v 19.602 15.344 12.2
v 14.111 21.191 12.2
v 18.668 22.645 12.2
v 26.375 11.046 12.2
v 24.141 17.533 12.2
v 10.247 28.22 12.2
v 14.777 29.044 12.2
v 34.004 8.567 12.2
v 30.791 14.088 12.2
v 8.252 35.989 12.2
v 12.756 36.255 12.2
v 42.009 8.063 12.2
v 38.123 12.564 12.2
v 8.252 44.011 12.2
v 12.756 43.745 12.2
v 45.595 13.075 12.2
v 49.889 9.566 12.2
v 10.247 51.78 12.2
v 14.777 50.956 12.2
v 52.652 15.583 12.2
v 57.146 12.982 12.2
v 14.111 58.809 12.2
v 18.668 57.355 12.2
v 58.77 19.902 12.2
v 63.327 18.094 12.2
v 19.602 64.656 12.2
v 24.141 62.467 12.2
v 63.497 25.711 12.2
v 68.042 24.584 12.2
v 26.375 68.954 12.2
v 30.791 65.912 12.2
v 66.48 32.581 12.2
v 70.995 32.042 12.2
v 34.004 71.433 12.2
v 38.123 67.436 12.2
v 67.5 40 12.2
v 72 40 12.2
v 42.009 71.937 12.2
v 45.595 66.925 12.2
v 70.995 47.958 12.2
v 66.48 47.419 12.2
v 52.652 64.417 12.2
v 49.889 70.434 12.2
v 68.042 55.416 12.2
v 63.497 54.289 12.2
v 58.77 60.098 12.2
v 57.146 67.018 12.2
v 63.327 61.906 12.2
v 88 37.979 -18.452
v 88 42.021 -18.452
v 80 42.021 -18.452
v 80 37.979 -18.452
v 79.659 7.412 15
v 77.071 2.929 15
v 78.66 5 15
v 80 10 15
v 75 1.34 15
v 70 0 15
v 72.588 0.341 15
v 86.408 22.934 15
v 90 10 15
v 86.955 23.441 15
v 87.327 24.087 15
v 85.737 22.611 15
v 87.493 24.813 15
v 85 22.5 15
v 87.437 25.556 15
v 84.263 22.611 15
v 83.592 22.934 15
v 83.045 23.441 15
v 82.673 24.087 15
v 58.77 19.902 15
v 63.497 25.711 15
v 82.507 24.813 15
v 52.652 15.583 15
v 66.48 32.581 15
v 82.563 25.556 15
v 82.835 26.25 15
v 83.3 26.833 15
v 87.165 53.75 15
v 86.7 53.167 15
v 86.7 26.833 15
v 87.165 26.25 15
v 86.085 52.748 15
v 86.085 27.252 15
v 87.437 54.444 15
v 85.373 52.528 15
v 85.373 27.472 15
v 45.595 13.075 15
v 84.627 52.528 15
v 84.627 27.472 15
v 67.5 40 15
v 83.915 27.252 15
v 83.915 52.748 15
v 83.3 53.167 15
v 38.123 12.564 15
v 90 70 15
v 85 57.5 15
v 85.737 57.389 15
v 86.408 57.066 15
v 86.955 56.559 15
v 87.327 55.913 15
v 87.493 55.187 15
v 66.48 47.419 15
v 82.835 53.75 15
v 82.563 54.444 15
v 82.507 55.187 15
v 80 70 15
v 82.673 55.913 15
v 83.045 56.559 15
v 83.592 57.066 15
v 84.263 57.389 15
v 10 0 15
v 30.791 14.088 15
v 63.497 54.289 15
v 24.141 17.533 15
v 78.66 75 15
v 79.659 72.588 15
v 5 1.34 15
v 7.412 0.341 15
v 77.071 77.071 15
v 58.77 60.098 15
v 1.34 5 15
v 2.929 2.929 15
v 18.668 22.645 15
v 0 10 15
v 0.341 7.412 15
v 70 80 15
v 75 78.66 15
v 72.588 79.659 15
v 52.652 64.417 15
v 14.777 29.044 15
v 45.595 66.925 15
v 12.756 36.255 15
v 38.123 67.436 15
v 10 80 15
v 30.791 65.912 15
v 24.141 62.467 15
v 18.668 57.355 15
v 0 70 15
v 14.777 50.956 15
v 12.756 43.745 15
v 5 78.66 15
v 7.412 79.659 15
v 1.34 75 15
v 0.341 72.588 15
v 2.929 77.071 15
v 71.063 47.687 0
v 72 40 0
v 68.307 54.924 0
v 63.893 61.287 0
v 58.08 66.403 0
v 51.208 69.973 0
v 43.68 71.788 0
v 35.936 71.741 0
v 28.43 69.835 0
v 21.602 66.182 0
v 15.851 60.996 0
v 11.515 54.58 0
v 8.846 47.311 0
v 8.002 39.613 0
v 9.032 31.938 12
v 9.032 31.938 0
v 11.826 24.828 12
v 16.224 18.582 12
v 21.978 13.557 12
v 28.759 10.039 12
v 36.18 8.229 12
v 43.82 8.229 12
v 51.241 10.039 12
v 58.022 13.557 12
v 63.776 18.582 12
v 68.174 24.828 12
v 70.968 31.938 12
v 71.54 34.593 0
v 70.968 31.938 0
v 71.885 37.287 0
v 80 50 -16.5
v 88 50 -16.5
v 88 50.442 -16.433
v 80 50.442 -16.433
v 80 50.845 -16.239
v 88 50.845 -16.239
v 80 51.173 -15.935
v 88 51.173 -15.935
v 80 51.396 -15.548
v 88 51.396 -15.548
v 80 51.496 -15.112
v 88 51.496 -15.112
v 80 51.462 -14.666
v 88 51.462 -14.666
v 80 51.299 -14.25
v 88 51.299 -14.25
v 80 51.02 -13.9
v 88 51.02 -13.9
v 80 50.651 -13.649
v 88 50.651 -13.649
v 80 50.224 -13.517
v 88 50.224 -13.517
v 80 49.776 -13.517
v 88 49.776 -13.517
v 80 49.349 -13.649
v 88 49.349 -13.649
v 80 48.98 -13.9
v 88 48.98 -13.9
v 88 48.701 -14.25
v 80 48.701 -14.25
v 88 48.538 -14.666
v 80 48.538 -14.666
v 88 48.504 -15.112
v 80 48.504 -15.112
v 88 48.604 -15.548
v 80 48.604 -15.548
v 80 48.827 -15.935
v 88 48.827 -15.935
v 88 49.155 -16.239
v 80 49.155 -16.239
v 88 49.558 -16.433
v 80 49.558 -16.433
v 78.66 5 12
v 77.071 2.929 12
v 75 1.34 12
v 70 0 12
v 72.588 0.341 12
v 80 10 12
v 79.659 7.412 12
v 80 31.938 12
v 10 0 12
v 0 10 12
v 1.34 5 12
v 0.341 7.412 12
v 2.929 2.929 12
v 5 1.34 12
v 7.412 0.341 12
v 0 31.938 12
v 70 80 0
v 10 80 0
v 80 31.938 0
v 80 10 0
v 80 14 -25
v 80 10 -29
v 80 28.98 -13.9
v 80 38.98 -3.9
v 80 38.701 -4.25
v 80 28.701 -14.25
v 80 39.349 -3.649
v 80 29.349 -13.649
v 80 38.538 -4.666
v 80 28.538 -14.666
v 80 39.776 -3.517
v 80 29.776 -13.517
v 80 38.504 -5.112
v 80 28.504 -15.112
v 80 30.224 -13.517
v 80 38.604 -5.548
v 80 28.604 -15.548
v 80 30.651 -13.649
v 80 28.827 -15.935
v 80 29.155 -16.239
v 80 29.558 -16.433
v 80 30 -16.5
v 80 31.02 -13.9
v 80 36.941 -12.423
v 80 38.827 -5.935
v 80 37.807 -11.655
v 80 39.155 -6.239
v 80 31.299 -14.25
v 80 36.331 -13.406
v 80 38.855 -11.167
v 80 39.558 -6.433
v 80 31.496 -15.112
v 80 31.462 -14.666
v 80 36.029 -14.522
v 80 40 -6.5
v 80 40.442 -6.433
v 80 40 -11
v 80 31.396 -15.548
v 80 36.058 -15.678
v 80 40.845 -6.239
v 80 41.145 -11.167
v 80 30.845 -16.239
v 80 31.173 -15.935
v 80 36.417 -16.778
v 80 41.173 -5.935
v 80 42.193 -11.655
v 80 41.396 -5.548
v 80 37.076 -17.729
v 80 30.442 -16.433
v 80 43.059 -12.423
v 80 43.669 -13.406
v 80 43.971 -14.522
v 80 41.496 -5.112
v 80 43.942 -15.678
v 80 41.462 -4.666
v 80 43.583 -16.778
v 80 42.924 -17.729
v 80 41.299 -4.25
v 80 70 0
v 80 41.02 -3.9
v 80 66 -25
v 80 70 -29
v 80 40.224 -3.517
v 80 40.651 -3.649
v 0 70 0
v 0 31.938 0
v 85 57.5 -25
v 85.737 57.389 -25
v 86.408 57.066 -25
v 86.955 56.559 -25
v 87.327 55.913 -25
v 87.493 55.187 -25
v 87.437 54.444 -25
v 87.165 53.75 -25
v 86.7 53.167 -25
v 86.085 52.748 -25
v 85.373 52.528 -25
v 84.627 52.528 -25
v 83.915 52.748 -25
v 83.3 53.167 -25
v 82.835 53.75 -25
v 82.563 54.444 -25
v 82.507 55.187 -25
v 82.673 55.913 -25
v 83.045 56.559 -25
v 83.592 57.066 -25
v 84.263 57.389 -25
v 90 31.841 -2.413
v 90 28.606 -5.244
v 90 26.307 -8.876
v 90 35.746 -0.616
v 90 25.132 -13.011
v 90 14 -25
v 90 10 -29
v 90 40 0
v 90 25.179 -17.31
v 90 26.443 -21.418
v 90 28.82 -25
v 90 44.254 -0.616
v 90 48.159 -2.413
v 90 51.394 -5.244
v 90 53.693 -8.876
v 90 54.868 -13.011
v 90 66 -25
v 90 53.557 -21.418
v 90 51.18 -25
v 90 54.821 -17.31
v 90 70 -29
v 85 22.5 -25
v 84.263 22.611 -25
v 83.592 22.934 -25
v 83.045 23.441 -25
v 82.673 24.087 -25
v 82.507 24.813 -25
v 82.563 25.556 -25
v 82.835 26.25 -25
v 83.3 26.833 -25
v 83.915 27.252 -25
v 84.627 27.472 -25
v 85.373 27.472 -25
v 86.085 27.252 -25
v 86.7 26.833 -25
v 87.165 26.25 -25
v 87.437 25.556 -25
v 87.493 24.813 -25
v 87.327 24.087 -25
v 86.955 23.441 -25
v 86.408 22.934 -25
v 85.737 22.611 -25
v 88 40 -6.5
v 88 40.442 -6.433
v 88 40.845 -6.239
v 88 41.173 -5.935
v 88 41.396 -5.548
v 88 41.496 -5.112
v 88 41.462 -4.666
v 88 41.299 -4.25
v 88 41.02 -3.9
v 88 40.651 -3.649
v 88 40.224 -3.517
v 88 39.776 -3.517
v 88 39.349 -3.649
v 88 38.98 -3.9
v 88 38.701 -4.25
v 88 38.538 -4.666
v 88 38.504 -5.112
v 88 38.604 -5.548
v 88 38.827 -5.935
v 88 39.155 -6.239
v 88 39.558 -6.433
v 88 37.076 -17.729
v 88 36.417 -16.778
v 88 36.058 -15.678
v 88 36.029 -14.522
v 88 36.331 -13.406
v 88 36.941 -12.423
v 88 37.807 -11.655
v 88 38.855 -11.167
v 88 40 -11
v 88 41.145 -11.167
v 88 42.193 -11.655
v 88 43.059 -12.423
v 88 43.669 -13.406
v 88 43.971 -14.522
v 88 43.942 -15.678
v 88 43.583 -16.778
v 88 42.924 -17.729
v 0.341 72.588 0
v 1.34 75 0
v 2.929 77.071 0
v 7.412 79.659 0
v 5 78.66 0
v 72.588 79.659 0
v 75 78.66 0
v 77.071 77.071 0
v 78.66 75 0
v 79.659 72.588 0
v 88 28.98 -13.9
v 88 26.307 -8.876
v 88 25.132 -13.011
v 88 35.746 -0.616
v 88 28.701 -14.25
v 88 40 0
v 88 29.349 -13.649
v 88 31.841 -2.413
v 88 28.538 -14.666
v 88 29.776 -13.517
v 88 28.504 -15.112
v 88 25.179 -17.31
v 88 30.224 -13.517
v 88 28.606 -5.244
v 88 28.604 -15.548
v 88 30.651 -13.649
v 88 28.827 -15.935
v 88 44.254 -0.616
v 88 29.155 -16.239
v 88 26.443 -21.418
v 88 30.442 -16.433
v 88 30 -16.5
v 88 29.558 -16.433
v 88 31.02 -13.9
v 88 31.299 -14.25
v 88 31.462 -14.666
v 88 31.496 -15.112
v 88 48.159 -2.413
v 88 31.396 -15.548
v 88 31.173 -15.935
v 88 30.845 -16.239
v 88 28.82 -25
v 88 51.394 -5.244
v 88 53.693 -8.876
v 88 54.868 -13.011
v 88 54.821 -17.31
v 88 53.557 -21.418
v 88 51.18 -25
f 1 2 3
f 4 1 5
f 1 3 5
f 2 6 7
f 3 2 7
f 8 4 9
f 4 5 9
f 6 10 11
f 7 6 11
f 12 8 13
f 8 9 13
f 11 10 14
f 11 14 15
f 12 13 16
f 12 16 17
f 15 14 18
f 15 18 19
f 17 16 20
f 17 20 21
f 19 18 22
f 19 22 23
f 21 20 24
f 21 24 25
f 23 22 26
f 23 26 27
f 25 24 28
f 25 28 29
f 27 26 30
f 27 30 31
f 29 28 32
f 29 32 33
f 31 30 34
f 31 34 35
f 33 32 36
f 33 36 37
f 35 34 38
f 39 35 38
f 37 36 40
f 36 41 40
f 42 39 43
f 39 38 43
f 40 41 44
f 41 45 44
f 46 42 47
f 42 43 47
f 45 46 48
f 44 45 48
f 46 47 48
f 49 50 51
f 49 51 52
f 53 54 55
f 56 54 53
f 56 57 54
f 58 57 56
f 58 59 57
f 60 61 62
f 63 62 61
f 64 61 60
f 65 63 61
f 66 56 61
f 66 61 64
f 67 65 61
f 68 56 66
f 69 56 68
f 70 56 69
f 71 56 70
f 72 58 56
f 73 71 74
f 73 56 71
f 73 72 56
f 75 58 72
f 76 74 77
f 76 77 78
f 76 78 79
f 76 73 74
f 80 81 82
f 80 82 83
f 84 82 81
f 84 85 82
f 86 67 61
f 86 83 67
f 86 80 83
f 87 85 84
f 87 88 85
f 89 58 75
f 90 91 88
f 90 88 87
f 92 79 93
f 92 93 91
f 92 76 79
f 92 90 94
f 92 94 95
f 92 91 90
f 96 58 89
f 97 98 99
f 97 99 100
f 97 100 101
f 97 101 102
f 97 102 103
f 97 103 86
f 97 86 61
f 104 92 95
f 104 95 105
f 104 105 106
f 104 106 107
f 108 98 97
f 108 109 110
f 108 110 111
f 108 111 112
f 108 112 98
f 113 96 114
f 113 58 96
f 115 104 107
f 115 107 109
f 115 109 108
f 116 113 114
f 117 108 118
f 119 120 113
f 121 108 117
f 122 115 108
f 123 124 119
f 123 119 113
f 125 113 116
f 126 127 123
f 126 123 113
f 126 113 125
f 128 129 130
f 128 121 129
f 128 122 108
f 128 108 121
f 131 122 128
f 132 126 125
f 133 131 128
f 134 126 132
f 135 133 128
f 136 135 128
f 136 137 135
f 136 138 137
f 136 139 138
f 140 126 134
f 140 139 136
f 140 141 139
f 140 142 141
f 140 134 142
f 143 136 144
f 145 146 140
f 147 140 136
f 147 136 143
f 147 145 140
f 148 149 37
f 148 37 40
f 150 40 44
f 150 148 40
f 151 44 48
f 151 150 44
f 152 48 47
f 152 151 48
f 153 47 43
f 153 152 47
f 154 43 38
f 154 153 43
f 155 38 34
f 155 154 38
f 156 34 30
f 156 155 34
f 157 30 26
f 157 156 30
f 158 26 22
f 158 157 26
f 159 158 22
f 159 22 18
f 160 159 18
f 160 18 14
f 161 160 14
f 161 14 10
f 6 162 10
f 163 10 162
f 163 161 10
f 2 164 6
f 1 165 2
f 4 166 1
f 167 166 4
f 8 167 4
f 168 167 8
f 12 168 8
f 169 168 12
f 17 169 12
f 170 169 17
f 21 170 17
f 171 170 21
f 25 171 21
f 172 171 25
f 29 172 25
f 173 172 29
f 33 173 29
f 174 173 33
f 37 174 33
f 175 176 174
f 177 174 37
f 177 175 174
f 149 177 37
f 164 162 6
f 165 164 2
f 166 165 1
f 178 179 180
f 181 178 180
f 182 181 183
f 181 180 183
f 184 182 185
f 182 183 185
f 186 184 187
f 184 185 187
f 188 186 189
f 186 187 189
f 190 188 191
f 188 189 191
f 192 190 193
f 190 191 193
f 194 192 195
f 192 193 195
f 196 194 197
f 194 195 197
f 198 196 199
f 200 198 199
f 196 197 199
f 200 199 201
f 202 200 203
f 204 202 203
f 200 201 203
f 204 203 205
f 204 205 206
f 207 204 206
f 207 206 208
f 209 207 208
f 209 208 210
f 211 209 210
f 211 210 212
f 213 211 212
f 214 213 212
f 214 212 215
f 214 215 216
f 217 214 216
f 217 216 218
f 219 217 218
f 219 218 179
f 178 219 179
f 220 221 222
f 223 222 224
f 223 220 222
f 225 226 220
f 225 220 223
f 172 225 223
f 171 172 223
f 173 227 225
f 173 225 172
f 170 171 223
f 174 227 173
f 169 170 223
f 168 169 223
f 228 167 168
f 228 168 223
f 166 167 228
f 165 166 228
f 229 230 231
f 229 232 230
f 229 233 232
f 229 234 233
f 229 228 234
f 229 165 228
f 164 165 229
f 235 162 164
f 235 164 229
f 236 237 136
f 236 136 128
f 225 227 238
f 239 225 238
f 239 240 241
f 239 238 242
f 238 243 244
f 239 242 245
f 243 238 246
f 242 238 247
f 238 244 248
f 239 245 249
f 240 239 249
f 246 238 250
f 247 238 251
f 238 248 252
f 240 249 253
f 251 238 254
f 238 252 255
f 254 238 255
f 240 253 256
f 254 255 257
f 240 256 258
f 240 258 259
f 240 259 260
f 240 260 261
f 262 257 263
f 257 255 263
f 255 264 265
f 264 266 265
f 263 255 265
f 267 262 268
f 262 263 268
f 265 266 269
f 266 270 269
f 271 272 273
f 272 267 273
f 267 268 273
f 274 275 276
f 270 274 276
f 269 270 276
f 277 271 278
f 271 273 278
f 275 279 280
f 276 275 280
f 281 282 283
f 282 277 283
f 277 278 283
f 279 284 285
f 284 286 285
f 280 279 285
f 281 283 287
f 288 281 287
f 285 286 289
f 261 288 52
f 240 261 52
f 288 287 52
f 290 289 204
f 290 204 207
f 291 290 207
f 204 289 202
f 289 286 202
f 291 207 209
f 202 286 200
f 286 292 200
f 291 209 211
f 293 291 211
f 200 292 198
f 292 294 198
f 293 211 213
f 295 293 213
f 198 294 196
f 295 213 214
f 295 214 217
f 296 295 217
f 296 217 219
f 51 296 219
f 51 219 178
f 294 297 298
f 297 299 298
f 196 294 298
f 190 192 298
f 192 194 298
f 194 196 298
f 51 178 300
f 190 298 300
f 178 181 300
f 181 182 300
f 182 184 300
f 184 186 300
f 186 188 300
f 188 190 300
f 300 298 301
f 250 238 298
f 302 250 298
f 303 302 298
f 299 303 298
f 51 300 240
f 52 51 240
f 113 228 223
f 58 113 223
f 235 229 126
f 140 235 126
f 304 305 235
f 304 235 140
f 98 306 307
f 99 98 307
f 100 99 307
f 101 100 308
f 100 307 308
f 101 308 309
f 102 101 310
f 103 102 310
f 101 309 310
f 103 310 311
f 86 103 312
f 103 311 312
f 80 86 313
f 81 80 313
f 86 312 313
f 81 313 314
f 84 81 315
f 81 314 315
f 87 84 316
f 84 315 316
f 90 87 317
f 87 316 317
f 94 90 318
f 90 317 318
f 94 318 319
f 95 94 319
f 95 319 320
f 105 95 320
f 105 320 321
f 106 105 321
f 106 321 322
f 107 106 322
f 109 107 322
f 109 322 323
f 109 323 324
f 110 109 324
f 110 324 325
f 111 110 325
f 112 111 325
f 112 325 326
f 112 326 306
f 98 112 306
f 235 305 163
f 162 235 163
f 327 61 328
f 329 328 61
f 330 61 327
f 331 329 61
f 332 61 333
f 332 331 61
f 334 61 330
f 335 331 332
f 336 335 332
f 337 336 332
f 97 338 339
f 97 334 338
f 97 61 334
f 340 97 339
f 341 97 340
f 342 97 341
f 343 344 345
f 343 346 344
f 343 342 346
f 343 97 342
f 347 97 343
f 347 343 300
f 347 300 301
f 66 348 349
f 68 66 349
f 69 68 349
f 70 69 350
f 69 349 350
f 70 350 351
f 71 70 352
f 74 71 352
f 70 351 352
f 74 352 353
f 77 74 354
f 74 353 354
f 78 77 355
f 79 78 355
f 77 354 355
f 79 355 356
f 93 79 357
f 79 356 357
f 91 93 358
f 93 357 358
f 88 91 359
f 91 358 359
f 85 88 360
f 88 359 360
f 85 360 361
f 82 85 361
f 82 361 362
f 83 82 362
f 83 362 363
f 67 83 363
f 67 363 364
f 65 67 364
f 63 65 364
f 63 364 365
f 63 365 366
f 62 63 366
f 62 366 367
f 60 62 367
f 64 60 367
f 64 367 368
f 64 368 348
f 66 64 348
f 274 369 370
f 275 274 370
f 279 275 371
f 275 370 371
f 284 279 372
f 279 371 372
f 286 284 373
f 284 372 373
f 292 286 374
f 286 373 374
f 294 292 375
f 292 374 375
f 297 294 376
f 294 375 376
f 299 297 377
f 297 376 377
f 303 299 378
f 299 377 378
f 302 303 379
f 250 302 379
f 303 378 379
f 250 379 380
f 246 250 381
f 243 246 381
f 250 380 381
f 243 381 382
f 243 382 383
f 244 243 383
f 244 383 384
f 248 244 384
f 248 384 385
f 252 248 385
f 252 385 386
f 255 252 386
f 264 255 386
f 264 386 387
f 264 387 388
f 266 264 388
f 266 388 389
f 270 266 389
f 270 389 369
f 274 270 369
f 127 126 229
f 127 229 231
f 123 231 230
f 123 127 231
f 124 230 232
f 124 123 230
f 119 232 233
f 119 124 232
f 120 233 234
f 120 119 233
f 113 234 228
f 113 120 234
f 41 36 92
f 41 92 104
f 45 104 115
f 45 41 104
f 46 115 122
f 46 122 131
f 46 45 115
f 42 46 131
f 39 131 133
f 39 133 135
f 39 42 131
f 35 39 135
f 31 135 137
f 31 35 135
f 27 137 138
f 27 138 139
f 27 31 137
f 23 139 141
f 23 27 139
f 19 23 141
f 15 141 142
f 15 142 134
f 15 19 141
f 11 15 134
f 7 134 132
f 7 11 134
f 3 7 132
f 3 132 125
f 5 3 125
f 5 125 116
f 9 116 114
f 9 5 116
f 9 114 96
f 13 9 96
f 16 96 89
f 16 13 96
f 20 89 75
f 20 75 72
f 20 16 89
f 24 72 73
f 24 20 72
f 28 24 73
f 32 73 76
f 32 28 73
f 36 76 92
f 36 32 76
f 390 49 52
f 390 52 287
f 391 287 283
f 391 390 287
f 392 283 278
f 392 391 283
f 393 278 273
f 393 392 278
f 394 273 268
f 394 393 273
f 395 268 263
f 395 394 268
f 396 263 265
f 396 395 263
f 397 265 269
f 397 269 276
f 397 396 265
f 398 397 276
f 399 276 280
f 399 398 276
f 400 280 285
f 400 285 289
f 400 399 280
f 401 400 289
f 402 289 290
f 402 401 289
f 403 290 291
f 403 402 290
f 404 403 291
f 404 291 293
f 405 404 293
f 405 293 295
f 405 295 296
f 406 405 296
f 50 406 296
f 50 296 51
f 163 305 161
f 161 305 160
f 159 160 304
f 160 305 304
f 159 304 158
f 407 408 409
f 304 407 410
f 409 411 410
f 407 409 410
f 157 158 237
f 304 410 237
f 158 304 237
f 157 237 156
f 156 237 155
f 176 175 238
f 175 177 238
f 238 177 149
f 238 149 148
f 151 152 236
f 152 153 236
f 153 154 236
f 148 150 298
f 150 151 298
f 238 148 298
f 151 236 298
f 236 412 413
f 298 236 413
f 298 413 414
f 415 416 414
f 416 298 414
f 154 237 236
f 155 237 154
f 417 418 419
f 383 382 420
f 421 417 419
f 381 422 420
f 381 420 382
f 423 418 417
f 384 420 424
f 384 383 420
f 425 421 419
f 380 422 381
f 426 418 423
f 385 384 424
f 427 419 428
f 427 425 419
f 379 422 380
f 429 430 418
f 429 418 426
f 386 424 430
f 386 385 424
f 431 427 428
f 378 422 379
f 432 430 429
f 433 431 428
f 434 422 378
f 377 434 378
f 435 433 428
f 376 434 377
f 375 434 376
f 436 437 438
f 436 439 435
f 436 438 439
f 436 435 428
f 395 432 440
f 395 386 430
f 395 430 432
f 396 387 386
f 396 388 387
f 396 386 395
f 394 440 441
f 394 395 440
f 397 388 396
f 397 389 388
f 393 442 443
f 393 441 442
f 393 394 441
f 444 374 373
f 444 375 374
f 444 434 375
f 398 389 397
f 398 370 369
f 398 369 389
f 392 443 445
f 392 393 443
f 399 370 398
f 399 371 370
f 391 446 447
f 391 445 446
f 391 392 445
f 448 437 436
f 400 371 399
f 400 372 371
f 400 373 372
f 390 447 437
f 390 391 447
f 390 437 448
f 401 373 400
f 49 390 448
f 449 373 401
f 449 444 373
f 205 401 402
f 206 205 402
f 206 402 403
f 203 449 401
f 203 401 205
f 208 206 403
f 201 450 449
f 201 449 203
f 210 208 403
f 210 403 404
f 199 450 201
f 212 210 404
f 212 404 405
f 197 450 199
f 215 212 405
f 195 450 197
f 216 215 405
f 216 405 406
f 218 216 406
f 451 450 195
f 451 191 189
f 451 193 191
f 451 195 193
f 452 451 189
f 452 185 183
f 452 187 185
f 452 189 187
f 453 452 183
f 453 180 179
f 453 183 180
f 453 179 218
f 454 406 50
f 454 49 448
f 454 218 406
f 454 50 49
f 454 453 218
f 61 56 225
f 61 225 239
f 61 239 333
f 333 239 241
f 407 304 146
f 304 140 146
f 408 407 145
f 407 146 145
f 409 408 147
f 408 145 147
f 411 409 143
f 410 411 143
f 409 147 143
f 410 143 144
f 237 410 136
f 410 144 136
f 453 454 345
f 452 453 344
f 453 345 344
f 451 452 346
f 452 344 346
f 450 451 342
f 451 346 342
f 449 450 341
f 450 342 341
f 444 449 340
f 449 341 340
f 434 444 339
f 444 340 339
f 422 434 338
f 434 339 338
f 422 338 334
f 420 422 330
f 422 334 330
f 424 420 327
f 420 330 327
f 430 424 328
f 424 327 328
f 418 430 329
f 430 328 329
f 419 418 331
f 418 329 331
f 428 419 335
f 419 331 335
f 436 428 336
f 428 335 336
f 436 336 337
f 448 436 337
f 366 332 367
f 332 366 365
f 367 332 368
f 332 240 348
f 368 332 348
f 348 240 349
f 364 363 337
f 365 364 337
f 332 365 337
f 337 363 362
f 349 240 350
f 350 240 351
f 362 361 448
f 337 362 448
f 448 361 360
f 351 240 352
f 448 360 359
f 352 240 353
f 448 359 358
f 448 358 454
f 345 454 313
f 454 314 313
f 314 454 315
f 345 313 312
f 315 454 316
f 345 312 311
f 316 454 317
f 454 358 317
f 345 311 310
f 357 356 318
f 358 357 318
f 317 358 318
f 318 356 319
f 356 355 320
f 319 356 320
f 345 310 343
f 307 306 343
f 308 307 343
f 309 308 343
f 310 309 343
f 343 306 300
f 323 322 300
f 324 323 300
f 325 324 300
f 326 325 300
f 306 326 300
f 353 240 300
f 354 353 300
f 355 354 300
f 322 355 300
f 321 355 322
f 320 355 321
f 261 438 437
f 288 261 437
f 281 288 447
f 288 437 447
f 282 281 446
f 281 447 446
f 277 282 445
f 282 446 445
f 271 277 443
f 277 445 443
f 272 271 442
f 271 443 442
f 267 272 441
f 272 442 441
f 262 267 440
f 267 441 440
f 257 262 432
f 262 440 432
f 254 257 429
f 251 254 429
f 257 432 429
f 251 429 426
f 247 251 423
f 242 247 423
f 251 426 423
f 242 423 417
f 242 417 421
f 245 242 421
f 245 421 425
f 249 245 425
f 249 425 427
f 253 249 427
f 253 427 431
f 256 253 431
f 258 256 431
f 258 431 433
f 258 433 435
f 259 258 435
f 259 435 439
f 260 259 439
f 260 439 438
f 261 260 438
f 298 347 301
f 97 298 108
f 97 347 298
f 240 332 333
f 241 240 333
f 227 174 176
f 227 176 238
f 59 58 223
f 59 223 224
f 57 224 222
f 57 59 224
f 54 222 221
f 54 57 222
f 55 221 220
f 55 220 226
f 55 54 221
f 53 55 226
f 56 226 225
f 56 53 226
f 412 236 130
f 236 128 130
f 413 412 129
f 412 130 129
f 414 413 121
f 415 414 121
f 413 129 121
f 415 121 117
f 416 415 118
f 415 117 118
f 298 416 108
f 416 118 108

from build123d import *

# Parameters (mm, degrees)
SKETCH1_W           = 80
SKETCH1_H           = 80
SKETCH1_R           = 32
BOSS_EXTRUDE1_DEPTH = 15
BOSS_EXTRUDE2_START = -2.8
SKETCH2_R           = 32
SKETCH2_R_2         = 27.5
BOSS_EXTRUDE2_DEPTH = 2.8
FILLET1_R           = 10
SKETCH4_W           = 40
SKETCH4_H           = 60
BOSS_EXTRUDE3_DEPTH = 10
SKETCH10_R          = 2.5
CUT_EXTRUDE2_DEPTH  = 127.885775404
BOSS_EXTRUDE7_DEPTH = 10
CUT_EXTRUDE3_DEPTH  = 10
SKETCH13_R          = 1.5
CUT_EXTRUDE5_DEPTH  = 30
SKETCH14_R          = 15
CUT_EXTRUDE6_DEPTH  = 2
SKETCH16_W          = 60.967741935
SKETCH16_H          = 31.937806786
CUT_EXTRUDE10_DEPTH = 12
SKETCH17_W          = 80
SKETCH17_H          = 10
CUT_EXTRUDE11_DEPTH = 12
SKETCH18_R          = 2
CUT_EXTRUDE12_DEPTH = 20
CUT_EXTRUDE14_DEPTH = 12


with BuildPart() as part:
    # Sketch1 → Boss-Extrude1 (new body)
    with BuildSketch(Plane.XY):
        with Locations((40, 40)):
            Rectangle(SKETCH1_W, SKETCH1_H)
        with Locations((40, 40)):
            Circle(SKETCH1_R, mode=Mode.SUBTRACT)
    extrude(amount=BOSS_EXTRUDE1_DEPTH)

    # Sketch2 → Boss-Extrude2 (add)
    with BuildSketch(Plane.XY.offset(15).offset(BOSS_EXTRUDE2_START)):
        with Locations((40, 40)):
            Circle(SKETCH2_R)
        with Locations((40, 40)):
            Circle(SKETCH2_R_2, mode=Mode.SUBTRACT)
    extrude(amount=BOSS_EXTRUDE2_DEPTH)

    # Fillet1
    fillet1_edges = [part.edges().sort_by_distance(p)[0] for p in [
        (80, 0, 7.5),
        (0, 0, 7.5),
        (0, 80, 7.5),
        (80, 80, 7.5),
    ]]
    fillet(fillet1_edges, radius=FILLET1_R)

    # Sketch4 → Boss-Extrude3 (add)
    with BuildSketch(Plane(origin=(80, 0, 0), x_dir=(0, 0, -1), z_dir=(1, 0, 0))):
        with Locations((5, 40)):
            Rectangle(SKETCH4_W, SKETCH4_H)
    extrude(amount=BOSS_EXTRUDE3_DEPTH)

    # Sketch10 → Cut-Extrude2 (cut, through all)
    with BuildSketch(Plane(origin=(0, 0, -25), x_dir=(-1, 0, 0), z_dir=(0, 0, -1))):
        with Locations((-85, 55)):
            Circle(SKETCH10_R)
        with Locations((-85, 25)):
            Circle(SKETCH10_R)
    extrude(amount=-CUT_EXTRUDE2_DEPTH, mode=Mode.SUBTRACT)

    # Sketch11 → Boss-Extrude7 (add)
    with BuildSketch(Plane(origin=(90, 0, 0), x_dir=(0, 0, -1), z_dir=(1, 0, 0))):
        Polygon((25, 70), (25, 66), (29, 70), align=None)
        Polygon((25, 14), (29, 10), (25, 10), align=None)
    extrude(amount=-BOSS_EXTRUDE7_DEPTH)

    # Sketch12 → Cut-Extrude3 (cut)
    with BuildSketch(Plane(origin=(90, 0, 0), x_dir=(0, 0, -1), z_dir=(1, 0, 0))):
        with BuildLine():
            Line((18.45172909, 42.02127838), (18.45172909, 37.97872162))
            ThreePointArc((18.45172909, 37.97872162), (11, 40), (18.45172909, 42.02127838))
        make_face()
    extrude(amount=-CUT_EXTRUDE3_DEPTH, mode=Mode.SUBTRACT)

    # Sketch13 → Cut-Extrude5 (cut)
    with BuildSketch(Plane(origin=(90, 0, 0), x_dir=(0, 0, -1), z_dir=(1, 0, 0))):
        with Locations((15, 50)):
            Circle(SKETCH13_R)
        with Locations((15, 30)):
            Circle(SKETCH13_R)
        with Locations((5, 40)):
            Circle(SKETCH13_R)
    extrude(amount=-CUT_EXTRUDE5_DEPTH, mode=Mode.SUBTRACT)

    # Sketch14 → Cut-Extrude6 (cut)
    with BuildSketch(Plane(origin=(90, 0, 0), x_dir=(0, 0, -1), z_dir=(1, 0, 0))):
        with Locations((15, 40)):
            Circle(SKETCH14_R)
    extrude(amount=-CUT_EXTRUDE6_DEPTH, mode=Mode.SUBTRACT)

    # Sketch16 → Cut-Extrude10 (cut)
    with BuildSketch(Plane(origin=(0, 0, 0), x_dir=(-1, 0, 0), z_dir=(0, 0, -1))):
        with Locations((-39.516129033, 15.968903393)):
            Rectangle(SKETCH16_W, SKETCH16_H)
    extrude(amount=-CUT_EXTRUDE10_DEPTH, mode=Mode.SUBTRACT)

    # Sketch17 → Cut-Extrude11 (cut)
    with BuildSketch(Plane(origin=(0, 0, 0), x_dir=(-1, 0, 0), z_dir=(0, 0, -1))):
        with Locations((-40, 5)):
            Rectangle(SKETCH17_W, SKETCH17_H)
    extrude(amount=-CUT_EXTRUDE11_DEPTH, mode=Mode.SUBTRACT)

    # Sketch18 → Cut-Extrude12 (cut)
    with BuildSketch(Plane.XZ.offset(-10)):
        with Locations((5, 6)):
            Circle(SKETCH18_R)
        with Locations((75, 6)):
            Circle(SKETCH18_R)
    extrude(amount=-CUT_EXTRUDE12_DEPTH, mode=Mode.SUBTRACT)

    # Sketch21 → Cut-Extrude14 (cut)
    with BuildSketch(Plane(origin=(0, 0, 0), x_dir=(-1, 0, 0), z_dir=(0, 0, -1))):
        Polygon((0, 31.937806786), (-70.967741935, 31.937806786), (-80, 31.937806786), (-80, 0), (0, 0), align=None)
    extrude(amount=-CUT_EXTRUDE14_DEPTH, mode=Mode.SUBTRACT)


solid = part.part
